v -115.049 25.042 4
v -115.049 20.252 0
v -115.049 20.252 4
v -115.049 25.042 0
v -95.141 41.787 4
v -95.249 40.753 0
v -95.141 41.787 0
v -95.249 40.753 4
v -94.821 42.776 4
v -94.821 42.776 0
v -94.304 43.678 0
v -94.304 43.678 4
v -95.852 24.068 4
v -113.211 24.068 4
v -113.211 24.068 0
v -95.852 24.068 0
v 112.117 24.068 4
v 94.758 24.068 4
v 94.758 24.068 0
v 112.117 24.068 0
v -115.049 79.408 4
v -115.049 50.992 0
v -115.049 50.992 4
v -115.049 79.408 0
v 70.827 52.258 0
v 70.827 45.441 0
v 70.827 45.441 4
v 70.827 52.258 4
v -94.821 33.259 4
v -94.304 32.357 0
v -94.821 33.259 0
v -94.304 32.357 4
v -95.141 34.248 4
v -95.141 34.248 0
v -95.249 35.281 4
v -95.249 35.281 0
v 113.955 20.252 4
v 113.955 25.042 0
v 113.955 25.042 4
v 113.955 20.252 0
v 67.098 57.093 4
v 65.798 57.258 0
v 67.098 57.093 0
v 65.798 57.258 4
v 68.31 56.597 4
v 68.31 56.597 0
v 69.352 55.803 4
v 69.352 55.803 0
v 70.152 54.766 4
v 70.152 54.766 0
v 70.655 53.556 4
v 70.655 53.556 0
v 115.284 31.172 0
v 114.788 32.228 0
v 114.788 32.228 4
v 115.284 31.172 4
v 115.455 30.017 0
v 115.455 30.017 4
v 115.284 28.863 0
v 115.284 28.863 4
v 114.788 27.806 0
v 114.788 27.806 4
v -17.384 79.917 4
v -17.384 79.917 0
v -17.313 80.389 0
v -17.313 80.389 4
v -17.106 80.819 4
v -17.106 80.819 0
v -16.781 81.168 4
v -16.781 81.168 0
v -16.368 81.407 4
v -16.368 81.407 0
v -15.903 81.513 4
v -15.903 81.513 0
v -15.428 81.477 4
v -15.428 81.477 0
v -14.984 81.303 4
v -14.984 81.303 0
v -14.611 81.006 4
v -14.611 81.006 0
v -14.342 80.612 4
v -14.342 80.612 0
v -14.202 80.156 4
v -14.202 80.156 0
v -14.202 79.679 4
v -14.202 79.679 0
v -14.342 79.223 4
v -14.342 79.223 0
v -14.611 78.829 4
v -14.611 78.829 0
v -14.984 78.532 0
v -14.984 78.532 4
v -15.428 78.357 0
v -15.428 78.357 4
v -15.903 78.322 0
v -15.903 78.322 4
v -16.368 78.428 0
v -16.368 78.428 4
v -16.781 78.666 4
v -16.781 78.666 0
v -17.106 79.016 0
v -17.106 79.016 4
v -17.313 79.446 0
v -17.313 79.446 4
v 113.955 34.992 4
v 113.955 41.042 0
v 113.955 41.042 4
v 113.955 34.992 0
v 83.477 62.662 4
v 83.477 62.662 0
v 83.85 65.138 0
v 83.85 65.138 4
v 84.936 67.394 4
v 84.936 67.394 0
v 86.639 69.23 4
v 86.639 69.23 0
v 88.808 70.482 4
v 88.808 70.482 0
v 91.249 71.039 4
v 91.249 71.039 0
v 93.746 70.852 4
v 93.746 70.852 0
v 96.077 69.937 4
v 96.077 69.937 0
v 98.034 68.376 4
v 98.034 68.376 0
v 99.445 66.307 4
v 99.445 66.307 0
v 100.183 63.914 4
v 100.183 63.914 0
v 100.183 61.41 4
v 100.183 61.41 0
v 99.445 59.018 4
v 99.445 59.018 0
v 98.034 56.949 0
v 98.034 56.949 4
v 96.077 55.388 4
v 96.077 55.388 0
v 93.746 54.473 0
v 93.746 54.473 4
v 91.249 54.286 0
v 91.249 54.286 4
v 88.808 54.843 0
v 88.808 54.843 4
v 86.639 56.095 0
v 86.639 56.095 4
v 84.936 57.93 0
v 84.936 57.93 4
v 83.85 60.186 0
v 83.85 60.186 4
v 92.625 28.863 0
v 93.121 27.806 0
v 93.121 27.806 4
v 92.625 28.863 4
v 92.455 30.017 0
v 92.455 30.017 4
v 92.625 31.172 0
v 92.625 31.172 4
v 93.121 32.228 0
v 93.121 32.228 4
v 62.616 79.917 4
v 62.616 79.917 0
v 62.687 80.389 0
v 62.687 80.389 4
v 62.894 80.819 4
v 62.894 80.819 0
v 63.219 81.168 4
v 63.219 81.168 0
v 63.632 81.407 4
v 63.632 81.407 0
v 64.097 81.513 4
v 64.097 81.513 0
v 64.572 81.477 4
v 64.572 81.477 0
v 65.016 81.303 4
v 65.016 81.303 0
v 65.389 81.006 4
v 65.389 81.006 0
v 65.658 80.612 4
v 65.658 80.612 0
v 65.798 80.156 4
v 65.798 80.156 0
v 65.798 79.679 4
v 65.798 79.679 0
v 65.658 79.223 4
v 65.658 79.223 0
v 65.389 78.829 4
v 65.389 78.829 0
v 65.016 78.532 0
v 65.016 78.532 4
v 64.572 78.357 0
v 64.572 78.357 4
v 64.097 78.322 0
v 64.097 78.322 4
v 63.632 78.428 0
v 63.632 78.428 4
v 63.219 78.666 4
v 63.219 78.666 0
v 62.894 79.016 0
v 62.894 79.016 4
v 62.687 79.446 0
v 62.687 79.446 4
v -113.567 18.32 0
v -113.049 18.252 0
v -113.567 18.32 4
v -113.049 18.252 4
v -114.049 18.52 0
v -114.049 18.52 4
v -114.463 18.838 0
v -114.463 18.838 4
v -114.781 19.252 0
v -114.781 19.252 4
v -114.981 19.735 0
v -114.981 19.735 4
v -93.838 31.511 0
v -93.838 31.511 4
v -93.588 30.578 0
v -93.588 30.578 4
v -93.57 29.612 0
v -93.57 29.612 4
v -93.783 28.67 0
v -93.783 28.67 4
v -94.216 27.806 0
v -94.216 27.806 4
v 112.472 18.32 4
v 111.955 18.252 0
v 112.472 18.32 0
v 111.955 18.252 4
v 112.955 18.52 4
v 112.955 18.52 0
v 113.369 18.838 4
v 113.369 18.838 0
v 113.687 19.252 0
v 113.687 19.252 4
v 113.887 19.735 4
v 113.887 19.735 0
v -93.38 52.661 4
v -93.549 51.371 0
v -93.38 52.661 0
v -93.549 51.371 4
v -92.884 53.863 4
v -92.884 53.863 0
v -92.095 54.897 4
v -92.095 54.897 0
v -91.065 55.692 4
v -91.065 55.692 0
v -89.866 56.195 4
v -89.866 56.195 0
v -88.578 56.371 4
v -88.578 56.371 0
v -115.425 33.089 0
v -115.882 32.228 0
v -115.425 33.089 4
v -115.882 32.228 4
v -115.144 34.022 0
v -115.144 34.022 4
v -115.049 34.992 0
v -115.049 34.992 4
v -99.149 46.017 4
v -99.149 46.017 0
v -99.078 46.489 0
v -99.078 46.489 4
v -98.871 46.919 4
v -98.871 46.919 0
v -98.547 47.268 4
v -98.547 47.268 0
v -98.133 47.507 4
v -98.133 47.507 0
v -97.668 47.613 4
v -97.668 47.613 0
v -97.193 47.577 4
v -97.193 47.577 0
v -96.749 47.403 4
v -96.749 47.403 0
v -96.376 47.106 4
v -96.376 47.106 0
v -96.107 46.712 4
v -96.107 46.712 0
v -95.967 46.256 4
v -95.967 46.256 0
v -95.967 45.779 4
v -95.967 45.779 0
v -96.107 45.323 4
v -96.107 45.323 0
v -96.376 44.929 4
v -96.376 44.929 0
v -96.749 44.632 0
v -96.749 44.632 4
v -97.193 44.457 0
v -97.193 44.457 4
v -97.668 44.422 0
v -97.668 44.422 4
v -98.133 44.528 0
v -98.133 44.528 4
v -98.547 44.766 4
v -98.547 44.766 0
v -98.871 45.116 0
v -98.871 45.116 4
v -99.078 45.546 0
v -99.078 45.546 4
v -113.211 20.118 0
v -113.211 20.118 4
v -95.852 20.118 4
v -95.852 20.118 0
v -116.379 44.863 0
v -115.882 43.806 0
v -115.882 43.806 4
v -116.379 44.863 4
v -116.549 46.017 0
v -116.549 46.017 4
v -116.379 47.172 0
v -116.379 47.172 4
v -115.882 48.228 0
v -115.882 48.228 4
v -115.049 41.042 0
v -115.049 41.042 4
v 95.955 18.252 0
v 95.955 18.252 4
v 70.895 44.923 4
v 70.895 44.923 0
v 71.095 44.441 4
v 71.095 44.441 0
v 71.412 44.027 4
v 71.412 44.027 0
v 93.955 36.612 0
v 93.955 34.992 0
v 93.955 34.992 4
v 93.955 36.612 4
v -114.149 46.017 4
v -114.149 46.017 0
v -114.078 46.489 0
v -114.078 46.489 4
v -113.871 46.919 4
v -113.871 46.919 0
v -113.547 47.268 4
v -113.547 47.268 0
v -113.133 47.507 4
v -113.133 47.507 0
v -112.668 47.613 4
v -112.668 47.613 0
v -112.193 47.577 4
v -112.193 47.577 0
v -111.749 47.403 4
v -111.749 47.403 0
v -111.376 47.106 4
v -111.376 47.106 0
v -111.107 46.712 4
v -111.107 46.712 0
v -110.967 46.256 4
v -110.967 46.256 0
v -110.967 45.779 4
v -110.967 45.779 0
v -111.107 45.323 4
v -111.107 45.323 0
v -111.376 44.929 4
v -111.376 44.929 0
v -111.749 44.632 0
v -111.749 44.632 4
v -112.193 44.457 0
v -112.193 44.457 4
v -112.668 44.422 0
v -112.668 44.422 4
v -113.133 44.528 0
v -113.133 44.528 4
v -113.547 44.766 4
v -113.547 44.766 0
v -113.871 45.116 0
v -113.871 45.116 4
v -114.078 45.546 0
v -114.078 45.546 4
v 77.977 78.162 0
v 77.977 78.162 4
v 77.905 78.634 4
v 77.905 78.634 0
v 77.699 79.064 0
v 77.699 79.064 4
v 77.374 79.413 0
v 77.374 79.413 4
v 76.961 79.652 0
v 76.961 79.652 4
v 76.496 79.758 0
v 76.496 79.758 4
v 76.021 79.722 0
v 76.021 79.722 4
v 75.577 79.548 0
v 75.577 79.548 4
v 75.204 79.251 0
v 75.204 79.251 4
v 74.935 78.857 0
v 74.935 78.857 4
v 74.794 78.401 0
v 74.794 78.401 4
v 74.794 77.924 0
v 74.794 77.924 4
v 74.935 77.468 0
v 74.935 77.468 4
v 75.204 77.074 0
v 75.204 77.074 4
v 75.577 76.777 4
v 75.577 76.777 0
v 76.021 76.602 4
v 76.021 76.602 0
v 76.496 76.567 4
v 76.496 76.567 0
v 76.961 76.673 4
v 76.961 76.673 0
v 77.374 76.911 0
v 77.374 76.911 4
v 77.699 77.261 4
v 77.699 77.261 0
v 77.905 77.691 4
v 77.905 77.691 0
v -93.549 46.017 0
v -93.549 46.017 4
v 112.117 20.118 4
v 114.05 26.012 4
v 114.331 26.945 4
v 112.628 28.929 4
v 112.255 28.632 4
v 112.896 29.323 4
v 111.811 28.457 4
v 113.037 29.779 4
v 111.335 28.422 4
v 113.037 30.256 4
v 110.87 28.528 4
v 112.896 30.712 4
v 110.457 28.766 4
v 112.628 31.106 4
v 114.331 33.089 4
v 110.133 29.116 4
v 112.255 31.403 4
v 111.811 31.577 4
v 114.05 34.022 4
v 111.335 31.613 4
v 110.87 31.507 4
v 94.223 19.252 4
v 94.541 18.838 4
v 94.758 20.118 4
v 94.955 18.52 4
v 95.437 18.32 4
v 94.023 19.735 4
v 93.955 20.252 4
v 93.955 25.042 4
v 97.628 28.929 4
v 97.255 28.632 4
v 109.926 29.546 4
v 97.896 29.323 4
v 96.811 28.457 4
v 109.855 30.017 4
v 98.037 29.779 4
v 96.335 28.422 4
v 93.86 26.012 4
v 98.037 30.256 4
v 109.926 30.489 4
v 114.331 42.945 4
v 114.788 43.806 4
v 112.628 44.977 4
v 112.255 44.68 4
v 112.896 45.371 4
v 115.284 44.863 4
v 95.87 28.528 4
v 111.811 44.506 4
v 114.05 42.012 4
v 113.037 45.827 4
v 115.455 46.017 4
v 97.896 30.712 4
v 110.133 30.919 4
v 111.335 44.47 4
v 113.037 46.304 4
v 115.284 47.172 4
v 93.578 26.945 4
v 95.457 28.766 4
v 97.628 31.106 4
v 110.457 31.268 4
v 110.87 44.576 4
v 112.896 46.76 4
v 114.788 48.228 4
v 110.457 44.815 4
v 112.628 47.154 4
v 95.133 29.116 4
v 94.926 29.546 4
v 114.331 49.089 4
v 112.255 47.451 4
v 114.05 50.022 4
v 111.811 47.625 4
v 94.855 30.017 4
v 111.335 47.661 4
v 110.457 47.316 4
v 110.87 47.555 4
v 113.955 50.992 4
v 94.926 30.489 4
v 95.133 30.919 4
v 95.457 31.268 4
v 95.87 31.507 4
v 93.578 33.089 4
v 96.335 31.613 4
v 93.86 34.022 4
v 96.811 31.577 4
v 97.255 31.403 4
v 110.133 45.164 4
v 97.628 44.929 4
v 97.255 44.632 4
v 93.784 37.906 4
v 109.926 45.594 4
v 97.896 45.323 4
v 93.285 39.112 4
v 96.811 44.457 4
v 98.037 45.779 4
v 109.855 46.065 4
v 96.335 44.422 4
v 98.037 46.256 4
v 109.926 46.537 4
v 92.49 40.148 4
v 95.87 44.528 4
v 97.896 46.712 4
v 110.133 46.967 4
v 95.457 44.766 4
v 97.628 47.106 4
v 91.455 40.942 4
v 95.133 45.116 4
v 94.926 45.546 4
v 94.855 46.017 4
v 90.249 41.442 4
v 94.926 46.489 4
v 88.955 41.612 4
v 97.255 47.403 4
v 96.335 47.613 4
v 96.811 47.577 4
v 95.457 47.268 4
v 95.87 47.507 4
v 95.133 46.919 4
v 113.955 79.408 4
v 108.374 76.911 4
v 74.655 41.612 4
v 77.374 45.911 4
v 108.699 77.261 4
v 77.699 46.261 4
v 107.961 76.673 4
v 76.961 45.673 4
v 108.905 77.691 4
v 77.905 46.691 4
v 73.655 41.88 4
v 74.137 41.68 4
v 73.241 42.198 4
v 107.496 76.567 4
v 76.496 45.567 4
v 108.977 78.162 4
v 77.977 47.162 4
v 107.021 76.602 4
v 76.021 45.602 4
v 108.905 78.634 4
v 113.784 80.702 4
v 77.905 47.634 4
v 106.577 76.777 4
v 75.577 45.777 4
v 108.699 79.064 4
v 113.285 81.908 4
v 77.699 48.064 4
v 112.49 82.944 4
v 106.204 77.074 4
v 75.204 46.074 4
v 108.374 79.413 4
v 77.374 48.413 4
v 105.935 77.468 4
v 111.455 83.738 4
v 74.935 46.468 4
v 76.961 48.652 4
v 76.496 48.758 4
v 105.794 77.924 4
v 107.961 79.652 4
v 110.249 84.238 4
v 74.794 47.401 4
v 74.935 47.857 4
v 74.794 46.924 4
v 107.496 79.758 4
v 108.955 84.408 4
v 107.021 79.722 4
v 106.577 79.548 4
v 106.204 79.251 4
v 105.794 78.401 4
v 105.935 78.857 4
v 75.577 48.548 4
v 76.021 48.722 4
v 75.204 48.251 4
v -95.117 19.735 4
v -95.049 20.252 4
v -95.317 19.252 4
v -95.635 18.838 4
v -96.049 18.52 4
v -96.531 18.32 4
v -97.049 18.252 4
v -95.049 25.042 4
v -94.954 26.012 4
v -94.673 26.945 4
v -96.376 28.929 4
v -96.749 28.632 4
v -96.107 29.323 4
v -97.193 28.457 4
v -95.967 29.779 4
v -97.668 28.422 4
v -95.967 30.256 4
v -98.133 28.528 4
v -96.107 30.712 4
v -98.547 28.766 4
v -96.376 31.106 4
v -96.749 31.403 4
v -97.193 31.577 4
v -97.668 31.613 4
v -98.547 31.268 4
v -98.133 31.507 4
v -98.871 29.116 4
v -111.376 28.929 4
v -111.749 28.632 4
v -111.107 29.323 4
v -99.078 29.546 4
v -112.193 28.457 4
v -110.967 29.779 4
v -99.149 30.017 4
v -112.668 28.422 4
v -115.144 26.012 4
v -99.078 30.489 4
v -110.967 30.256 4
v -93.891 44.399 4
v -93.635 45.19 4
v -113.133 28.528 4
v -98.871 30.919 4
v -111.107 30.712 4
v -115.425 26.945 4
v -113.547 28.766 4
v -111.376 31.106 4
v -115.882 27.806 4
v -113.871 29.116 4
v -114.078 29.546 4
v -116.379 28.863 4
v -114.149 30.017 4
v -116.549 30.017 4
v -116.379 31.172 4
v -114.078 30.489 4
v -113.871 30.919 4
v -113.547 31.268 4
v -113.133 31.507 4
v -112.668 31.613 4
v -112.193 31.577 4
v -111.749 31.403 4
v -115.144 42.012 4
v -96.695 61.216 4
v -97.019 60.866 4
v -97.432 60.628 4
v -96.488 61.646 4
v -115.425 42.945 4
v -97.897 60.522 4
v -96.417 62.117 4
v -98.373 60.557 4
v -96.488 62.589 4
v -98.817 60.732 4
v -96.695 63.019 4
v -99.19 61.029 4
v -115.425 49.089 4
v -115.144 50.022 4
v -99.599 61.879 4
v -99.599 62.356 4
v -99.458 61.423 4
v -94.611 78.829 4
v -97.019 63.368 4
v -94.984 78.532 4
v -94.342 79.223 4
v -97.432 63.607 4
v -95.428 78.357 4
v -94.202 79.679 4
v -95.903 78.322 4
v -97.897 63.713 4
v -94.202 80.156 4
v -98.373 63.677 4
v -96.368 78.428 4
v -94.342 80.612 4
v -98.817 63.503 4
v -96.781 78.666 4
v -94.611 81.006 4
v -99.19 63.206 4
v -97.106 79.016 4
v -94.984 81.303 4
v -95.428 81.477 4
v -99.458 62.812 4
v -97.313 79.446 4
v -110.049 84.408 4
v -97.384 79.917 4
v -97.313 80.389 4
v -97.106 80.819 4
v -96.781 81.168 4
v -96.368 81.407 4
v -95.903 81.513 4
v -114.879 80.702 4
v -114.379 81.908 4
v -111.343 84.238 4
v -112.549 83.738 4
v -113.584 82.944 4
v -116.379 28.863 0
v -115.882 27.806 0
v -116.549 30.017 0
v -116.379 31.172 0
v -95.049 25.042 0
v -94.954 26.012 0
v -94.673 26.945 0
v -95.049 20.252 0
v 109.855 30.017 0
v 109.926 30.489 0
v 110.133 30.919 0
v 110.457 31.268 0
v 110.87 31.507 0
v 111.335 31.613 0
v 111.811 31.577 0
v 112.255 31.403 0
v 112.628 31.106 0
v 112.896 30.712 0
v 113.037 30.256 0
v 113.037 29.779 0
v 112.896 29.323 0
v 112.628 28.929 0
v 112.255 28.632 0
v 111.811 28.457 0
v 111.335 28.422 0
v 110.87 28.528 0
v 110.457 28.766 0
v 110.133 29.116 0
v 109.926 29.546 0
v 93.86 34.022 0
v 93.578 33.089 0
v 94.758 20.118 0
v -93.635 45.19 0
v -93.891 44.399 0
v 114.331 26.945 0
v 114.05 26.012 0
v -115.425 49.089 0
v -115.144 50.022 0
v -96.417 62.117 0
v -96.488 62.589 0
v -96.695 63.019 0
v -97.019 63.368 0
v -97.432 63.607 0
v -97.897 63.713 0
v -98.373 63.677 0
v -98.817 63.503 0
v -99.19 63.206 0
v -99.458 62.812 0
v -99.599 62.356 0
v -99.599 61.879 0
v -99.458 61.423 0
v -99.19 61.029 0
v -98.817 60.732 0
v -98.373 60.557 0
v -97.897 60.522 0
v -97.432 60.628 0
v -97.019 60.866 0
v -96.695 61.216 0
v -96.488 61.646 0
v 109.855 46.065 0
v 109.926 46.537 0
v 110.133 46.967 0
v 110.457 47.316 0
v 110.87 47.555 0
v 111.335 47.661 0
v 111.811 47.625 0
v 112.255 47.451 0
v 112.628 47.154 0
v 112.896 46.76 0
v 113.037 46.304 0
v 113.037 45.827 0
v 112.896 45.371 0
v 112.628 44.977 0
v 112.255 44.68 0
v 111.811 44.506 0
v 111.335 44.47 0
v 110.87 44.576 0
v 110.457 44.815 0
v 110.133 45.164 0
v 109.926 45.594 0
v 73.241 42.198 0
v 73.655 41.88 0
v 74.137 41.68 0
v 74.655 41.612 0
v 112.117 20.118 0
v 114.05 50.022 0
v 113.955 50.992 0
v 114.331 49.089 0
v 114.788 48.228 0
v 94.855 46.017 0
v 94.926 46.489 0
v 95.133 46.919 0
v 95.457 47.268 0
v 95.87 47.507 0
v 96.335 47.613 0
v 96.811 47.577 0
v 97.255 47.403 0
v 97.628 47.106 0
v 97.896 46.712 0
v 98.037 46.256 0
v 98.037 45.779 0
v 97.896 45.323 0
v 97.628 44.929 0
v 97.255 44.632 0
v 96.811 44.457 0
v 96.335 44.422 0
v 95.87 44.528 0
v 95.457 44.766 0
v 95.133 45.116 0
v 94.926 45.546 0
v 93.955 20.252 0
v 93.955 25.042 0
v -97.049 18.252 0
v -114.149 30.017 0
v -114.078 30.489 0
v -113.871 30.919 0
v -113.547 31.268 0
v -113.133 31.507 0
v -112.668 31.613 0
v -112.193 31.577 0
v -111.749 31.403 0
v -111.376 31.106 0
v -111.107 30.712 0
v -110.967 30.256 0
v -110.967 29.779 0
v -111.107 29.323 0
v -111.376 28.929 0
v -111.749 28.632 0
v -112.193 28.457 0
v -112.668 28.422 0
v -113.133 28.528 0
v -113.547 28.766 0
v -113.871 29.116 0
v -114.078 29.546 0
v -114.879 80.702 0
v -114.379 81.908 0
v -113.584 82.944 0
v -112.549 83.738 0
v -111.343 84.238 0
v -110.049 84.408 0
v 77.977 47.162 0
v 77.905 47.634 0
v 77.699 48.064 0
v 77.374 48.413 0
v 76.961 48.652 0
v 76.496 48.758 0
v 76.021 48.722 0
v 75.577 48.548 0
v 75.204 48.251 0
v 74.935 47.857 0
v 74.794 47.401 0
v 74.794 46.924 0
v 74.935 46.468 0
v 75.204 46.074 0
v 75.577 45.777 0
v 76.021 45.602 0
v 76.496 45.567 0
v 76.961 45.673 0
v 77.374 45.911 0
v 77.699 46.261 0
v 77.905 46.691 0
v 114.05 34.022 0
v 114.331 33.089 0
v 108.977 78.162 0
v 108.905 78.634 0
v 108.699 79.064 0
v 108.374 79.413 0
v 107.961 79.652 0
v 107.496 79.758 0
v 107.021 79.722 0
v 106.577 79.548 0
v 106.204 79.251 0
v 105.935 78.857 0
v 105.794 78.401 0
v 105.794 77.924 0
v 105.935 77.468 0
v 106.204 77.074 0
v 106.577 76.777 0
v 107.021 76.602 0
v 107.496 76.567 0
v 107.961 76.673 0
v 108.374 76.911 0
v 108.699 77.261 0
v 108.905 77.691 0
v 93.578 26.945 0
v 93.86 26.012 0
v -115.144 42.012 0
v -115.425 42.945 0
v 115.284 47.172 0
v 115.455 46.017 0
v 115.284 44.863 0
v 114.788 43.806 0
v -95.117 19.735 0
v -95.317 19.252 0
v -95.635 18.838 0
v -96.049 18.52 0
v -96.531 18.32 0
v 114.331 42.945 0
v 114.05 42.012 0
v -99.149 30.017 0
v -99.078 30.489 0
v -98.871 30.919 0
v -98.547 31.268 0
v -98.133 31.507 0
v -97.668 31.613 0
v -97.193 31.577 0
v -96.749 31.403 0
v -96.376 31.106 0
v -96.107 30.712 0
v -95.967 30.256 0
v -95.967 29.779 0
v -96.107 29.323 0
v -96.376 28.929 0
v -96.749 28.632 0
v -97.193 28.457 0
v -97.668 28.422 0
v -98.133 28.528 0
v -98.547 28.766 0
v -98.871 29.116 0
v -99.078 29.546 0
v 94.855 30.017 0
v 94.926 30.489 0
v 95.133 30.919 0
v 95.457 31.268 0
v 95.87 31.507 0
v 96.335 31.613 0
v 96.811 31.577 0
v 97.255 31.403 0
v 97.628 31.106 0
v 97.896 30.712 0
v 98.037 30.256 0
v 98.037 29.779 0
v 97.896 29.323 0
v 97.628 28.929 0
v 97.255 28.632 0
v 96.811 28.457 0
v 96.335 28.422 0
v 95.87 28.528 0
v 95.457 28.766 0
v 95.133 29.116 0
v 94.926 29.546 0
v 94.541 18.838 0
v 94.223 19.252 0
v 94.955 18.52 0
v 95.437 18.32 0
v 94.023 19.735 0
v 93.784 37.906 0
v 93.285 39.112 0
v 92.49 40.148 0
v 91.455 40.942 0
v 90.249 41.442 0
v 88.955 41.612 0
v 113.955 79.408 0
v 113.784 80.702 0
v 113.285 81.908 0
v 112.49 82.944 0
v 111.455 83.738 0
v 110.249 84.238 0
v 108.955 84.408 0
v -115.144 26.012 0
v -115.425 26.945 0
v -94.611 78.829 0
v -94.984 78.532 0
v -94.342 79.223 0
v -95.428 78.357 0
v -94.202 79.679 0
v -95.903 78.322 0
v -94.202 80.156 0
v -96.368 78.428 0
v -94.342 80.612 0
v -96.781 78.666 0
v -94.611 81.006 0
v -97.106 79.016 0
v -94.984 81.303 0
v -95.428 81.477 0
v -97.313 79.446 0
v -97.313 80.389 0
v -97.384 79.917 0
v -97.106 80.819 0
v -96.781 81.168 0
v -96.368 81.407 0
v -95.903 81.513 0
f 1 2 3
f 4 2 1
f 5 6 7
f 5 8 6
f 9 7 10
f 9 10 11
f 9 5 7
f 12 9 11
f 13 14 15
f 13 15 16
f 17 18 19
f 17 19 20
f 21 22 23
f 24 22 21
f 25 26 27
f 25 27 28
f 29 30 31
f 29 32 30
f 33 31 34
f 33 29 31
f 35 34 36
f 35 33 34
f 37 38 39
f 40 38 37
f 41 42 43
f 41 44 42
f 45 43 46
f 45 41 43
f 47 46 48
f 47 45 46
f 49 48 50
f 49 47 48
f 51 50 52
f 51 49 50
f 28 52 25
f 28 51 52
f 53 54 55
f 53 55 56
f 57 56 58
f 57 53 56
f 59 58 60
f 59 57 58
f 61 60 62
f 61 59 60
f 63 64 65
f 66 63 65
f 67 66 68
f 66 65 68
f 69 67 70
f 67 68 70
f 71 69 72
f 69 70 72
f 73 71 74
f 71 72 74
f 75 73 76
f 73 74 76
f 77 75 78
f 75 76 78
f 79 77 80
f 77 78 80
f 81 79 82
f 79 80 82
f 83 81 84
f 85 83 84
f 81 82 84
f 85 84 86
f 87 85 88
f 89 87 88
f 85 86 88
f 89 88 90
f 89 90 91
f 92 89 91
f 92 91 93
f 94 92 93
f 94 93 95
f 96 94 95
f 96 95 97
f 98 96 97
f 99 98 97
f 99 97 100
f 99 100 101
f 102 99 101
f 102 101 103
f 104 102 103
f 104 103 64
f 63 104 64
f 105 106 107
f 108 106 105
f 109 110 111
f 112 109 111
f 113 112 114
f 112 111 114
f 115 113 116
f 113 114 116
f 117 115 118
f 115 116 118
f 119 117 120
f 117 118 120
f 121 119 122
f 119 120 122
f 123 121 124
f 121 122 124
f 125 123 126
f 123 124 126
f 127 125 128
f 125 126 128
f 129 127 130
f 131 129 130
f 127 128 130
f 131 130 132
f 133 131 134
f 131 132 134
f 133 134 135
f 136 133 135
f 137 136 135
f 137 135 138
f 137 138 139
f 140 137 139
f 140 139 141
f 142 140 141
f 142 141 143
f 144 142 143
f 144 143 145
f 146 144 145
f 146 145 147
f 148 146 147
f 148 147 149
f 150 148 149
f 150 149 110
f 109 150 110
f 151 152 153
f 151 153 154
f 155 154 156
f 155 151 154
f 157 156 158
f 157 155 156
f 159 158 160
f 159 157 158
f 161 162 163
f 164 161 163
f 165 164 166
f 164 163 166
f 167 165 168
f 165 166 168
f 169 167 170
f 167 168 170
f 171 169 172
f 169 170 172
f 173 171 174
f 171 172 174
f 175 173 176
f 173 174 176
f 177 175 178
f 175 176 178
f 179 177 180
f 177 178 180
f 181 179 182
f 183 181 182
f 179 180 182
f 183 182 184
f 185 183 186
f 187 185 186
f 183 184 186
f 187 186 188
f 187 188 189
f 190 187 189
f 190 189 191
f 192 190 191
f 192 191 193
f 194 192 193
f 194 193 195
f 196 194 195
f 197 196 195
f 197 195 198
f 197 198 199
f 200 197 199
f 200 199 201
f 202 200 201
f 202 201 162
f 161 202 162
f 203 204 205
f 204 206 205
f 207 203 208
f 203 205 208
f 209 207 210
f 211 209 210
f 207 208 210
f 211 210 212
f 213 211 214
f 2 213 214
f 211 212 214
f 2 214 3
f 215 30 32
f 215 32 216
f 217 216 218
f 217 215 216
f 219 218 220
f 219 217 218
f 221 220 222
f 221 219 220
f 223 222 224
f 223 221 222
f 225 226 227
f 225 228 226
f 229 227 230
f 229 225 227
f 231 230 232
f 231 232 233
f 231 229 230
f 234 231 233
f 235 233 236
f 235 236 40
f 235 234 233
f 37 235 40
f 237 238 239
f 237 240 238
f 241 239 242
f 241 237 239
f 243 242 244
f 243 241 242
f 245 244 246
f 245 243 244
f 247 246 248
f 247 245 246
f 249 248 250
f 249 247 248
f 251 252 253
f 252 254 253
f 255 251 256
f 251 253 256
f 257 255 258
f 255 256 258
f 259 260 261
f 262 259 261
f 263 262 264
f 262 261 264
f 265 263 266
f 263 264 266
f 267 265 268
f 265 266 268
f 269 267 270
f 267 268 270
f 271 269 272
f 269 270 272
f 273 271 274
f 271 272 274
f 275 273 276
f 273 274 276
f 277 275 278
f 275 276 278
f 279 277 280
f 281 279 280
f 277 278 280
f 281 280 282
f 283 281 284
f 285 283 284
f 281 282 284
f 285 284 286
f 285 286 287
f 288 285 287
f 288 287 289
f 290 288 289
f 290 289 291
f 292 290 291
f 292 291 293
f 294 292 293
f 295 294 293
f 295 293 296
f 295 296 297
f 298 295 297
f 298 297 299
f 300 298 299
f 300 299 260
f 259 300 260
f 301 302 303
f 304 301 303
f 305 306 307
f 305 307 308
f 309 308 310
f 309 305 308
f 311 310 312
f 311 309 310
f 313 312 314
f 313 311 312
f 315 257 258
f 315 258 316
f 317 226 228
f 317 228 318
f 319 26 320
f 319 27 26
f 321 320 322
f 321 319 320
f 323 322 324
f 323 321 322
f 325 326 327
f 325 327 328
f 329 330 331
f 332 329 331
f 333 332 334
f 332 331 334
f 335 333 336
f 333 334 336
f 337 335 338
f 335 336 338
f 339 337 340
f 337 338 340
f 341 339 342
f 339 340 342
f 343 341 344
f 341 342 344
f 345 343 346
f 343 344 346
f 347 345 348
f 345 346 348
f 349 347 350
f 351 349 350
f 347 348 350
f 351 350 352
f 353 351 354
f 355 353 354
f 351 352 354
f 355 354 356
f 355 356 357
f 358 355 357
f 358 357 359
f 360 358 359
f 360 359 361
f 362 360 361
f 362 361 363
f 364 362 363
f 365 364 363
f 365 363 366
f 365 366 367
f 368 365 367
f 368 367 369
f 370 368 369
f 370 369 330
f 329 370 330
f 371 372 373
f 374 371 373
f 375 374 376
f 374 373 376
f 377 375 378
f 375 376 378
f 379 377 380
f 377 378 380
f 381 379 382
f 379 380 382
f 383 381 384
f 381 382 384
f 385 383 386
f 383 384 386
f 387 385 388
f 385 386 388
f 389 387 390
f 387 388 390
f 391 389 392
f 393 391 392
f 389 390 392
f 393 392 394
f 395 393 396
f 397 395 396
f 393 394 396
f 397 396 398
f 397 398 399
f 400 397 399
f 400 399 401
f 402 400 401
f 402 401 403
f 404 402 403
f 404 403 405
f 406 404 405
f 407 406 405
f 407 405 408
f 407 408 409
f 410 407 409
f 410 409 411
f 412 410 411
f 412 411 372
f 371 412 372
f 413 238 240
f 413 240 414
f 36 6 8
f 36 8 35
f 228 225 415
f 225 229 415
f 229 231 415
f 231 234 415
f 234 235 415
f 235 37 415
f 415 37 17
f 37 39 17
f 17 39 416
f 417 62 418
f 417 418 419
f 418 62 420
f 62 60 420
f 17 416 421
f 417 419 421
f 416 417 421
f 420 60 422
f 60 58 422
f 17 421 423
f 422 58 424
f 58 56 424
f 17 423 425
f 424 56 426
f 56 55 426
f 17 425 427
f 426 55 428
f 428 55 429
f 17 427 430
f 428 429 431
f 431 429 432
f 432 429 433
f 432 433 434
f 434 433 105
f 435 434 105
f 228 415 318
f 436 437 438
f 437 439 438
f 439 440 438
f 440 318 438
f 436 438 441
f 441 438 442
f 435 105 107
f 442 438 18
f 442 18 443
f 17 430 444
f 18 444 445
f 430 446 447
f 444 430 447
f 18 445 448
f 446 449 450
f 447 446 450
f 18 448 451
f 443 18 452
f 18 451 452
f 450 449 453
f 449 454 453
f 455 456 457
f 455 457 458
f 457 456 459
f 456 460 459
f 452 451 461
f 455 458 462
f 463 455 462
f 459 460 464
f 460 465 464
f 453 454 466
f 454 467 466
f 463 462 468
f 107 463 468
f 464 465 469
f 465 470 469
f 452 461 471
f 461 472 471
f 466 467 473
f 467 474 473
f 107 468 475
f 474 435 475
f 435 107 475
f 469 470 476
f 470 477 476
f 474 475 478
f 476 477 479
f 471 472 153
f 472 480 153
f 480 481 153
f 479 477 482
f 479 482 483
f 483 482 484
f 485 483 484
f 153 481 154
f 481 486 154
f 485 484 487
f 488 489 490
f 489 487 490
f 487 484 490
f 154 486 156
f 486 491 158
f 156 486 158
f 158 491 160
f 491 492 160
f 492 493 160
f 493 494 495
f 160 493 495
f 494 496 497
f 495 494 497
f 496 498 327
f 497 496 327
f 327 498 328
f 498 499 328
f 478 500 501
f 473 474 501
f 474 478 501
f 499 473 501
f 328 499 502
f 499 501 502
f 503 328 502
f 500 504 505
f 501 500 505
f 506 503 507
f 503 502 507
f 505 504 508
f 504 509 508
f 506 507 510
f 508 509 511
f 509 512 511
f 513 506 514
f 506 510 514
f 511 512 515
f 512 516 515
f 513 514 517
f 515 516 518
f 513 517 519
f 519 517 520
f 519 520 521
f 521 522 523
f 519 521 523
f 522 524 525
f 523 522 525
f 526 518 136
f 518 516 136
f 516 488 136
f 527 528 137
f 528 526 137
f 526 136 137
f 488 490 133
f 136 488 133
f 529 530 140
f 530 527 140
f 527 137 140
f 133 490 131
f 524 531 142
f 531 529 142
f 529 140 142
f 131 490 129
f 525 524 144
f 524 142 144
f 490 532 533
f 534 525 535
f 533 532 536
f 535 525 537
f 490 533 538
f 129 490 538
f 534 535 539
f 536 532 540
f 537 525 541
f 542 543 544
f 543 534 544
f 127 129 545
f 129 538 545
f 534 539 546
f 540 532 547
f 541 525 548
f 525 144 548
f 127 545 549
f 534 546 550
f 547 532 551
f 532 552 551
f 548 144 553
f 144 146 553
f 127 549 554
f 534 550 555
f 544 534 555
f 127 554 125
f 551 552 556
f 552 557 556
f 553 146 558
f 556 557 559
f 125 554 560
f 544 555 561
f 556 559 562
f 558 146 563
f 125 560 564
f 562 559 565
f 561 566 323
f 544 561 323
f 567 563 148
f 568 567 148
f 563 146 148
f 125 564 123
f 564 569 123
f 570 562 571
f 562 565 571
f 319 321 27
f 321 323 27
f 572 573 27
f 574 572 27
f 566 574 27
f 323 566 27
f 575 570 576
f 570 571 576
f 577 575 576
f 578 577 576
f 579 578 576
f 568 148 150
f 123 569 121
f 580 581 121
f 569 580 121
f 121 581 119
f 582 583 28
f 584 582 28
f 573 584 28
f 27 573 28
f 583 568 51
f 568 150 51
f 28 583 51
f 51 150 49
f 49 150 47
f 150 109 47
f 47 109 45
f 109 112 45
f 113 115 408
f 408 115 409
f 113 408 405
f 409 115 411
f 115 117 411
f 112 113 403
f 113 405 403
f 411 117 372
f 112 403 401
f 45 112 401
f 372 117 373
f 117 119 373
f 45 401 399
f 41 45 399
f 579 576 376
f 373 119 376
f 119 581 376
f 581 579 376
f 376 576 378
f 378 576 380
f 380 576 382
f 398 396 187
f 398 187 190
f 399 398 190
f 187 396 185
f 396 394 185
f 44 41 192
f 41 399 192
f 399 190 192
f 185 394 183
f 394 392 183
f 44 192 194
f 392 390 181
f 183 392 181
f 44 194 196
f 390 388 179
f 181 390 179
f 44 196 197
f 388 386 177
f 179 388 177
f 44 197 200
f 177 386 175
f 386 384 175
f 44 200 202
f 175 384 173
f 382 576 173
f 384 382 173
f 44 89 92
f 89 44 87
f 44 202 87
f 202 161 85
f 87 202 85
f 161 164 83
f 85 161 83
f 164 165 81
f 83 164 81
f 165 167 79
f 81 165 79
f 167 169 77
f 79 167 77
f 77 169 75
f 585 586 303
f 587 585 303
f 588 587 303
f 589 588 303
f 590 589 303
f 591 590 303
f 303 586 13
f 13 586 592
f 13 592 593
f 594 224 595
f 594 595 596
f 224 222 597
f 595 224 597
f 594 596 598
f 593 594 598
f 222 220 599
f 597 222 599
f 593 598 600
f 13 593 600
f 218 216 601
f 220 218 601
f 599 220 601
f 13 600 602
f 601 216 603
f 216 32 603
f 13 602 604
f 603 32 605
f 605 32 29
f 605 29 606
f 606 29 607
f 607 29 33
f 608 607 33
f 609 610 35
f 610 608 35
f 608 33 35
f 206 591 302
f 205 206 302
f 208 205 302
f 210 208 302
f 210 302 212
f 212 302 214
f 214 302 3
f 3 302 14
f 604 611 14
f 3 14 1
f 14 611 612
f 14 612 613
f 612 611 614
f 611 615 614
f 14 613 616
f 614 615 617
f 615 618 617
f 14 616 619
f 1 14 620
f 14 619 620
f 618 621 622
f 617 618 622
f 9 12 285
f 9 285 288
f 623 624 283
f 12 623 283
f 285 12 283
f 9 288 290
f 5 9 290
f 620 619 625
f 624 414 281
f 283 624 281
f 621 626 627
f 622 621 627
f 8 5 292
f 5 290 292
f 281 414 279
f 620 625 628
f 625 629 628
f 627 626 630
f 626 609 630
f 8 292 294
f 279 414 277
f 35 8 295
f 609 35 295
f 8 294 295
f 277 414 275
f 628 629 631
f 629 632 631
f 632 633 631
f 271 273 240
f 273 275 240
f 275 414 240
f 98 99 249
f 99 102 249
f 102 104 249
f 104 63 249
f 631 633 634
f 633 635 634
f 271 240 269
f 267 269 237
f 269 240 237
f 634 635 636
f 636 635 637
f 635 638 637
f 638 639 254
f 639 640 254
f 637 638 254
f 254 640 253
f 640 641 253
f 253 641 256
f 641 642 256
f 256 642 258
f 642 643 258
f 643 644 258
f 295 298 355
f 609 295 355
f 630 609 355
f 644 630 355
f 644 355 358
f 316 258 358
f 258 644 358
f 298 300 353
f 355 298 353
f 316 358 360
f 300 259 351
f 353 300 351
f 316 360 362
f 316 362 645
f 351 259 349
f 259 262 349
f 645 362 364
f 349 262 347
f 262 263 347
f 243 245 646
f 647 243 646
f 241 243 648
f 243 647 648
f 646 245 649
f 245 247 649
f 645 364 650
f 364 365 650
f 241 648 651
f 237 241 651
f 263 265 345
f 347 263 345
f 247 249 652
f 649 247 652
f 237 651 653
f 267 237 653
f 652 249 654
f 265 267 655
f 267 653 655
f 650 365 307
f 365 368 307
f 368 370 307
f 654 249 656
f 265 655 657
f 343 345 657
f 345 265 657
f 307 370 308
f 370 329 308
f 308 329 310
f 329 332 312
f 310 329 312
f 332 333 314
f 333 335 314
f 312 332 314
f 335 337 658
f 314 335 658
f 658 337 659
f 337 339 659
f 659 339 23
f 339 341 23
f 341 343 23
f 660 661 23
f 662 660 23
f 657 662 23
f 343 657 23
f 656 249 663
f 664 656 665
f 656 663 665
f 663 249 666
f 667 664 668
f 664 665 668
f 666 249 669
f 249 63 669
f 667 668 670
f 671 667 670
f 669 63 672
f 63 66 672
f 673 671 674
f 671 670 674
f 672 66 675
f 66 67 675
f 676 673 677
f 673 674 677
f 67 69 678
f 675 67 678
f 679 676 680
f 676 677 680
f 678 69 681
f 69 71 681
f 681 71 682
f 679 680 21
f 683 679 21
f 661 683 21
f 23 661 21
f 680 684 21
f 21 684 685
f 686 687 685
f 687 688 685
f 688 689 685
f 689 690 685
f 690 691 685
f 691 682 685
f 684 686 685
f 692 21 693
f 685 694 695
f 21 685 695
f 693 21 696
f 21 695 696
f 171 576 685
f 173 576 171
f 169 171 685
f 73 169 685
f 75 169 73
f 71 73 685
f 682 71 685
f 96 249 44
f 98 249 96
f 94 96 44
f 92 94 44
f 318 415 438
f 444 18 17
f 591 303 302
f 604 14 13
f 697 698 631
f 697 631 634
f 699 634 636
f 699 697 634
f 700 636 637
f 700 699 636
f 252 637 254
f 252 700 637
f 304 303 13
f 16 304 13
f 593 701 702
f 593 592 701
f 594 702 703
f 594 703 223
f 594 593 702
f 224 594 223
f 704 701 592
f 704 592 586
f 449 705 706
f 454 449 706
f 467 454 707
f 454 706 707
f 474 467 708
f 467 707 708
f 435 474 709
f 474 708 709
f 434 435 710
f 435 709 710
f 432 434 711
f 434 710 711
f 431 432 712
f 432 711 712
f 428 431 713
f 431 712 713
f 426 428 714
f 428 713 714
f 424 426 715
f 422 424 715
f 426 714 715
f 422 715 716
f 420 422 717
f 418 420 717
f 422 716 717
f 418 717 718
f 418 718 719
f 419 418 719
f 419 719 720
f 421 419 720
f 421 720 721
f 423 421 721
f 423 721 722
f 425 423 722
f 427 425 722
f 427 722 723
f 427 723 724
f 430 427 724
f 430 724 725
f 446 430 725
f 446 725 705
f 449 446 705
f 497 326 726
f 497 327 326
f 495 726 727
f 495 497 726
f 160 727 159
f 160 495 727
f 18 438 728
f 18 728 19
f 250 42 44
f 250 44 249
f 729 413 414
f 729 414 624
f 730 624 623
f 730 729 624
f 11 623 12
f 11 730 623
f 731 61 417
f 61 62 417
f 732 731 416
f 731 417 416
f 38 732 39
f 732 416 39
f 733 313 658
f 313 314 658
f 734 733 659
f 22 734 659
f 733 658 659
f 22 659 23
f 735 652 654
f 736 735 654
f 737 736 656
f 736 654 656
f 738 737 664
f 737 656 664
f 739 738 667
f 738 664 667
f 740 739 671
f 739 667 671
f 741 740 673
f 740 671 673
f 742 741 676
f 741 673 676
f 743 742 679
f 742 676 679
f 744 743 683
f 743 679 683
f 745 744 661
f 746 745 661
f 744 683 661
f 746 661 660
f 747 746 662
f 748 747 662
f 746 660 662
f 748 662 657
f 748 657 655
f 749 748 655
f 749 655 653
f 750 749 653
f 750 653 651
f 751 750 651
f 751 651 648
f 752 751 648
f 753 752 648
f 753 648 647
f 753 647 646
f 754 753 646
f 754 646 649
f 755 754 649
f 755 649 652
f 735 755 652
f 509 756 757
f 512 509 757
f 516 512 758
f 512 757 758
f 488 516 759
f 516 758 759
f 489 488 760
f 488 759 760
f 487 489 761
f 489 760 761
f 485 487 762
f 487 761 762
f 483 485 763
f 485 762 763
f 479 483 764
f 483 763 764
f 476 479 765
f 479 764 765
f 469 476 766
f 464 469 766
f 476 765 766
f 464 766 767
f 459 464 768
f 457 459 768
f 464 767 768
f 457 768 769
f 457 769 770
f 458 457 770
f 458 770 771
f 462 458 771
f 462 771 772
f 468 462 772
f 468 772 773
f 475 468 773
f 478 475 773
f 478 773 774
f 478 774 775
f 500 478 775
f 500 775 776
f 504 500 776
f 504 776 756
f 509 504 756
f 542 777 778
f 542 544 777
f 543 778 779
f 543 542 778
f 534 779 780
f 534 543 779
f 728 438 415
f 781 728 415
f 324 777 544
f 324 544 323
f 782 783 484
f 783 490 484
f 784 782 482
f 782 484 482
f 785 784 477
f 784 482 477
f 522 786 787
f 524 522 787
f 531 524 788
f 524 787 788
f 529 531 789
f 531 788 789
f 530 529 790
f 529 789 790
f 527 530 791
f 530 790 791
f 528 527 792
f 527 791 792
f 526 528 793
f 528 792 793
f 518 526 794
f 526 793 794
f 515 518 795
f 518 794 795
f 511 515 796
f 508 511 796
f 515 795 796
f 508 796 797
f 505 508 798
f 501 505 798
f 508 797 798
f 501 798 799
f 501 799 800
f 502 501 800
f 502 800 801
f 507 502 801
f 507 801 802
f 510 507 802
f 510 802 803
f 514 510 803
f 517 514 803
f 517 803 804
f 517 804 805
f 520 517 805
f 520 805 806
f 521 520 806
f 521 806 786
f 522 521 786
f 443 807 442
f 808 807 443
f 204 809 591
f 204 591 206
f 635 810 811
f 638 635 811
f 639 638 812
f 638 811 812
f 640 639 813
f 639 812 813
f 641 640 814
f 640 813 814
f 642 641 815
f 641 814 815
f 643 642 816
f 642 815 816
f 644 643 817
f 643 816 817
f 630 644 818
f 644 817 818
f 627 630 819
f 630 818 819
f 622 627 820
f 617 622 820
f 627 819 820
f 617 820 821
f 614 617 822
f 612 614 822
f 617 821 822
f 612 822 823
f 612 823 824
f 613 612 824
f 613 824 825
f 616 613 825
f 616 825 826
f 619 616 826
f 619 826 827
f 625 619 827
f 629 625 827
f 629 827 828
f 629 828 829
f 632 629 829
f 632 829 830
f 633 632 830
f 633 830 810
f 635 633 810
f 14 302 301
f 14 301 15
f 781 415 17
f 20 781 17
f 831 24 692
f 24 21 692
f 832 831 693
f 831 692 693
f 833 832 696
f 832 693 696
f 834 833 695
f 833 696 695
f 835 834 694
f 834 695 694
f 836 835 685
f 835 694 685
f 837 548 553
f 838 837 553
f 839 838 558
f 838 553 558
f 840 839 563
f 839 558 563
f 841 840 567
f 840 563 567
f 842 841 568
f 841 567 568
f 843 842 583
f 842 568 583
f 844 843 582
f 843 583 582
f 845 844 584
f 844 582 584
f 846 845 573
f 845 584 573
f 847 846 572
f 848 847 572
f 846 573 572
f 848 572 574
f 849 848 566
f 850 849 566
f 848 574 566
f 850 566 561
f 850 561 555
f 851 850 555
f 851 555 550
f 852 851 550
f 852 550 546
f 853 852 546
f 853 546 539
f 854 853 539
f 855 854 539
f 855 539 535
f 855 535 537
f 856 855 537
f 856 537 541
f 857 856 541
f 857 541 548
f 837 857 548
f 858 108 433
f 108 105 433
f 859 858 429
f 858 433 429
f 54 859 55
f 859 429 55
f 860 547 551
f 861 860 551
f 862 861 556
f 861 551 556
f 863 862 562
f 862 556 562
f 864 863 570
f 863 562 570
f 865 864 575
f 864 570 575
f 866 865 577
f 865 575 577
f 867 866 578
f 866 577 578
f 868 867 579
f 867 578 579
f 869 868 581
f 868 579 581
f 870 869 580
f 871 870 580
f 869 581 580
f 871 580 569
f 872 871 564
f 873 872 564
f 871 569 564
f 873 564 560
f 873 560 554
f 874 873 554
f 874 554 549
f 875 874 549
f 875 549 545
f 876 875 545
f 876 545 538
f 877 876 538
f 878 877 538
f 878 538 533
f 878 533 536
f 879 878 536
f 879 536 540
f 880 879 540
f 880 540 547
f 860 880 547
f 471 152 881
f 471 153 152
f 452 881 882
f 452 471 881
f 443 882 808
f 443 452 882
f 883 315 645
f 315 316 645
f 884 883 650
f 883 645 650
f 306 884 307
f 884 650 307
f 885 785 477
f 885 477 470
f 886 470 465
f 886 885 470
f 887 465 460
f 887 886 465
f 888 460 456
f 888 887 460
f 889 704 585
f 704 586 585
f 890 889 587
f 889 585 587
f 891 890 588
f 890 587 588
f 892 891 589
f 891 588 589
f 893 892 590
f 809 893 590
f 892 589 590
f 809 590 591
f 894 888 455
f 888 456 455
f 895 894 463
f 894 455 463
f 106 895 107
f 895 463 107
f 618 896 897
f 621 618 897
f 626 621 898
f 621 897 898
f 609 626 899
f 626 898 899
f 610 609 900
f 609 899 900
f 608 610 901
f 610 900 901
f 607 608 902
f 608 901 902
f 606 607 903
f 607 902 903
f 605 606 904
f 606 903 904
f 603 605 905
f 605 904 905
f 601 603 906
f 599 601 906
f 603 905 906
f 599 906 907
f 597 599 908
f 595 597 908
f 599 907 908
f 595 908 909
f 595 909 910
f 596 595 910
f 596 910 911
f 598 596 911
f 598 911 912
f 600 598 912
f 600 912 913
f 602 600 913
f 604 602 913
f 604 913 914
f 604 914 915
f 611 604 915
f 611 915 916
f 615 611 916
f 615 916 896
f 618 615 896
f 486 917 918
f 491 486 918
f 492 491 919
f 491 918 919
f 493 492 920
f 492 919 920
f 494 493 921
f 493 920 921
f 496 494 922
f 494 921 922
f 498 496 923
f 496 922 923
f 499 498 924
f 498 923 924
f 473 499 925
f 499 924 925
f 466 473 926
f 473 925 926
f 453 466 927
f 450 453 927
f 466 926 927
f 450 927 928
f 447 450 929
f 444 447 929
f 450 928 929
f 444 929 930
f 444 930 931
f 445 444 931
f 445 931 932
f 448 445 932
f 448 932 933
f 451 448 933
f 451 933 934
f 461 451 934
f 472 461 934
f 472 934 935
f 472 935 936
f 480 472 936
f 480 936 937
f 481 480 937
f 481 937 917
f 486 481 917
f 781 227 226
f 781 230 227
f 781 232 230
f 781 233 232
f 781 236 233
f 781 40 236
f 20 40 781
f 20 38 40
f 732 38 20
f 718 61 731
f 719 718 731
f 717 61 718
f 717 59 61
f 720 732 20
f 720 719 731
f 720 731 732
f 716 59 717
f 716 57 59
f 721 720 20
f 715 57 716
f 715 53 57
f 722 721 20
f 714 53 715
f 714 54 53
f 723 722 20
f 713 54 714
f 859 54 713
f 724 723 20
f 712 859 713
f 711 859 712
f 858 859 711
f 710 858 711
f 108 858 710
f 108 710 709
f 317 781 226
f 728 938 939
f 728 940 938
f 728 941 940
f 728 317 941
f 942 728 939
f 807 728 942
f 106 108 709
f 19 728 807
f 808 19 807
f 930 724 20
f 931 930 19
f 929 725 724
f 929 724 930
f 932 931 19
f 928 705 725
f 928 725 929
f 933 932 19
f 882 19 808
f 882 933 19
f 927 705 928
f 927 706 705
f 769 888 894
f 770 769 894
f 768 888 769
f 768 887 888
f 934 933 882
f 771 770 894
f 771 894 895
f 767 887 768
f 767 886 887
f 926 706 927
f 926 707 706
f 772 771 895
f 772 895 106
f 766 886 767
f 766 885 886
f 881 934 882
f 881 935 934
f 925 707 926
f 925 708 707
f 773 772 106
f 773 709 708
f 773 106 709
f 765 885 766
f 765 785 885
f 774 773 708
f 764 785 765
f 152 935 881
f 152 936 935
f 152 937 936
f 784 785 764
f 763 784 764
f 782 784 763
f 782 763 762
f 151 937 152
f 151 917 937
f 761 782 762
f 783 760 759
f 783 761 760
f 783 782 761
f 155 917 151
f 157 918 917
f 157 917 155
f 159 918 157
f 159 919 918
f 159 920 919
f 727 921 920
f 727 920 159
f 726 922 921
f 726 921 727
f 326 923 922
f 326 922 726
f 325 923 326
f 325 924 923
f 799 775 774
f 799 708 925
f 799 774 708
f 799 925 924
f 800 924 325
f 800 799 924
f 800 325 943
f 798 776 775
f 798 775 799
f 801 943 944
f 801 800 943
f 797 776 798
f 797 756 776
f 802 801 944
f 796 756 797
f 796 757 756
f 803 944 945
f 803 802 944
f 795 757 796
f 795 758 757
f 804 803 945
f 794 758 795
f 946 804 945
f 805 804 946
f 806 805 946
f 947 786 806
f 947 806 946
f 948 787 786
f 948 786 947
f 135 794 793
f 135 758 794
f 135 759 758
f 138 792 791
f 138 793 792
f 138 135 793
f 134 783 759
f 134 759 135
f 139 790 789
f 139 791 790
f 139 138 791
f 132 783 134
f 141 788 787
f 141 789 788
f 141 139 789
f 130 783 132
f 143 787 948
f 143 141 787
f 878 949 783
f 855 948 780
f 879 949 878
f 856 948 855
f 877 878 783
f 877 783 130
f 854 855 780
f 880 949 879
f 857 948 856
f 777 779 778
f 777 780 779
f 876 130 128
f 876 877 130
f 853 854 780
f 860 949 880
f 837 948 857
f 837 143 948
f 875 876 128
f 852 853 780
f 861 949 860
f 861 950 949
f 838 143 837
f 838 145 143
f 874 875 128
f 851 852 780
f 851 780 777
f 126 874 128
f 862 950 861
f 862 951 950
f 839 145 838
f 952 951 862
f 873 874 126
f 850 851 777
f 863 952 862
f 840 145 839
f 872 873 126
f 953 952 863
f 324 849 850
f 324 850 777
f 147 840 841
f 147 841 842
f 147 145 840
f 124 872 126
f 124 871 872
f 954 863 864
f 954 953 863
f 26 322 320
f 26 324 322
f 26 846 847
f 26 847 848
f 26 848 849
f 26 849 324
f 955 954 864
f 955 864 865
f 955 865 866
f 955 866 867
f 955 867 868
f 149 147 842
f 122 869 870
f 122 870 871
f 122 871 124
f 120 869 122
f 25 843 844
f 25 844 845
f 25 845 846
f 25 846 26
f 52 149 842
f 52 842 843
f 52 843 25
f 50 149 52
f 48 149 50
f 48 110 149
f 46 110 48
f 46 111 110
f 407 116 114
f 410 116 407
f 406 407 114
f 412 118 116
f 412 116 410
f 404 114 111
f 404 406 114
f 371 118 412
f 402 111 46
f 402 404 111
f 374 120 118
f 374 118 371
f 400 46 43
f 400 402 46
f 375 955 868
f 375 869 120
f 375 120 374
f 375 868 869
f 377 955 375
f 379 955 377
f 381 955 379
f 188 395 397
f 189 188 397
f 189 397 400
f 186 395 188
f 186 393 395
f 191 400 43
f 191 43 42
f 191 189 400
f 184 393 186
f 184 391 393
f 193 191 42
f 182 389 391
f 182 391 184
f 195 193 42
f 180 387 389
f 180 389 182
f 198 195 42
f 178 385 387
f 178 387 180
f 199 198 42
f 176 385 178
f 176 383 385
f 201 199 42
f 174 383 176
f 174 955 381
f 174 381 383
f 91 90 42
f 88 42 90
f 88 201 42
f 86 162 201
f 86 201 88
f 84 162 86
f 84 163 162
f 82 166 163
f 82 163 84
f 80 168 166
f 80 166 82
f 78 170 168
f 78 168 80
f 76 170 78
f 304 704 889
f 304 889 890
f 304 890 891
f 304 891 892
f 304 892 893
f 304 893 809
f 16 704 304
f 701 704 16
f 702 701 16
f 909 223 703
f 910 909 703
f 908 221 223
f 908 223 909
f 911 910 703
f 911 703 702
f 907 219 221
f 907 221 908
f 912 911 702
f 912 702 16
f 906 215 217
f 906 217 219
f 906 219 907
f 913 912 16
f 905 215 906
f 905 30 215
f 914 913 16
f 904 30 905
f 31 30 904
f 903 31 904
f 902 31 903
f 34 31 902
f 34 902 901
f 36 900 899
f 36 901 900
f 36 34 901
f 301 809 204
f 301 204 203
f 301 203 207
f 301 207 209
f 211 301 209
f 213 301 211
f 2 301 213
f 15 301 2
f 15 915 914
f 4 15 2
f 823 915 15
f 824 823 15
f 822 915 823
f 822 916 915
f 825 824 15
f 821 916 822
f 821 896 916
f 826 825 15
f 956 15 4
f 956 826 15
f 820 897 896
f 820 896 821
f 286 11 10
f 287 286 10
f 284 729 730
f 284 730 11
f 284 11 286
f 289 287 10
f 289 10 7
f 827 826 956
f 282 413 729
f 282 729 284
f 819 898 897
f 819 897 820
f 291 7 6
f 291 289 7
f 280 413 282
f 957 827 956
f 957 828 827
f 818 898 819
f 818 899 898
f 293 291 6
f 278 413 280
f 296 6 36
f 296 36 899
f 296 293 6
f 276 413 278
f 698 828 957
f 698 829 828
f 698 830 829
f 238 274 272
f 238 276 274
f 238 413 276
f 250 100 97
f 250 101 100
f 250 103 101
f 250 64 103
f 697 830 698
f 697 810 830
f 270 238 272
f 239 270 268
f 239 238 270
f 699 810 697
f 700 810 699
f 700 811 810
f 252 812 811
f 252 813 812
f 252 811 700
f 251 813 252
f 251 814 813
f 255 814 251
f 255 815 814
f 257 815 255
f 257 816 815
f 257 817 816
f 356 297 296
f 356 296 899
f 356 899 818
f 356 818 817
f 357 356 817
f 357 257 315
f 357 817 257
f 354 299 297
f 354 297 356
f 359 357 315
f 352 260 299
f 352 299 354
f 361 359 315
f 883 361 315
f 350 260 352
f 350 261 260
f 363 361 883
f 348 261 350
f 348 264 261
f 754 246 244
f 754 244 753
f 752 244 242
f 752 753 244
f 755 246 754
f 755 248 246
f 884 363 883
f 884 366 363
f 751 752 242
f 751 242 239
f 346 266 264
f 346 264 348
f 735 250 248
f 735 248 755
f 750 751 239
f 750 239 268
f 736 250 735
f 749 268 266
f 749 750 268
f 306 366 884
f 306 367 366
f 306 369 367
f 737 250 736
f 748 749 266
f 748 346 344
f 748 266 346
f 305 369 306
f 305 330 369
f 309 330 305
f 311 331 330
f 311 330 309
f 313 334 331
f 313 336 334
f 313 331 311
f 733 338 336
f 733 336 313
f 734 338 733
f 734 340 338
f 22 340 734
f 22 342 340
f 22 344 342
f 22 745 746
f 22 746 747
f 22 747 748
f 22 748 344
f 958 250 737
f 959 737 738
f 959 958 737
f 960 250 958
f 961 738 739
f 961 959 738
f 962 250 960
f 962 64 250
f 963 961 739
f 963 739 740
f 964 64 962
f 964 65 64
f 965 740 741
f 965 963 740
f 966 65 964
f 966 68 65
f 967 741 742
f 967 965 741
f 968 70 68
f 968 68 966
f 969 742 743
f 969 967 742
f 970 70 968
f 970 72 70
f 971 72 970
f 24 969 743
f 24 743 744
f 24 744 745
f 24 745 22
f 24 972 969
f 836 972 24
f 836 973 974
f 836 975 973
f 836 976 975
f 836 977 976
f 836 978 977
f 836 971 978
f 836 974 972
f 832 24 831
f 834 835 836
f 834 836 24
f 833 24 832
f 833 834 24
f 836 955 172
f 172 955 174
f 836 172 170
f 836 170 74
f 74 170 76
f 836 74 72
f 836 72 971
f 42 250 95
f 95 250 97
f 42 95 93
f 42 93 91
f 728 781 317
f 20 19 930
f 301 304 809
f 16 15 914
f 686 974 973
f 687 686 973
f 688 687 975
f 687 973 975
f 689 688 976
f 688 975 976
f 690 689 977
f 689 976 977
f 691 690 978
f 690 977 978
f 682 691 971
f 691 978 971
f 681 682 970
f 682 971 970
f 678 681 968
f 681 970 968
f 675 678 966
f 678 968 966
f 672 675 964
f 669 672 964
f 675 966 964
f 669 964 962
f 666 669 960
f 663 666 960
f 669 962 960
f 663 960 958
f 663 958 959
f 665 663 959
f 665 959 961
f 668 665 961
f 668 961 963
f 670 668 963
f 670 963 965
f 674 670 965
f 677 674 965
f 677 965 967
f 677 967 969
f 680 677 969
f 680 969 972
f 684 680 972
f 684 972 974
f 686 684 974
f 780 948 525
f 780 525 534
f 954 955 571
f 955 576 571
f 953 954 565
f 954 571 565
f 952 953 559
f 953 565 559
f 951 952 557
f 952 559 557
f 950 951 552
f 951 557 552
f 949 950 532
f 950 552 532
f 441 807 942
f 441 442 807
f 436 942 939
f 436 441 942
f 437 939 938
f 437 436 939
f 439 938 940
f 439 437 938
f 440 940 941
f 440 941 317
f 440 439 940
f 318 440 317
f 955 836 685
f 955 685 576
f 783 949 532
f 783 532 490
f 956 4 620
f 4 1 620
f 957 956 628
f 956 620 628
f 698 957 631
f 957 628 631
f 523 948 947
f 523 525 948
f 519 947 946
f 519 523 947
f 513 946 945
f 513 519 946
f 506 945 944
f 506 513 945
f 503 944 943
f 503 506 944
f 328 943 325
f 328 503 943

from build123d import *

# Parameters (mm, degrees)
RESSALTO_EXTRUS_O1_DEPTH = 4
M3_CLEARANCE_HOLE2_D     = 3.2
ESBO_O7_R                = 8.4
CORTE_EXTRUS_O1_DEPTH    = 10
M3_CLEARANCE_HOLE1_D     = 3.2
M3_CLEARANCE_HOLE3_D     = 3.2
FILETE1_R                = 5
M3_CLEARANCE_HOLE5_D     = 3.2
FILETE2_R                = 2
ESBO_O16_W               = 17.35833251
ESBO_O16_H               = 3.95
ESBO_O16_W_2             = 17.358332509
CUT_EXTRUDE1_DEPTH       = 4
FILLET2_R                = 5


with BuildPart() as part:
    # Esboço1 → Ressalto-extrusão1 (new body)
    with BuildSketch(Plane.XY):
        with BuildLine():
            Line((-95.048931647, 26.894793301), (-95.048931647, 18.252242094))
            Line((-95.048931647, 18.252242094), (-115.048931647, 18.252242094))
            Line((-115.048931647, 18.252242094), (-115.048931647, 26.894793301))
            ThreePointArc((-115.048931647, 26.894793301), (-116.548931647, 30.0172923), (-115.048931647, 33.139791299))
            Line((-115.048931647, 33.139791299), (-115.048931647, 42.894793301))
            ThreePointArc((-115.048931647, 42.894793301), (-116.548931647, 46.0172923), (-115.048931647, 49.139791299))
            Line((-115.048931647, 49.139791299), (-115.048931647, 84.40808297))
            Line((-115.048931647, 84.40808297), (113.954781763, 84.40808297))
            Line((113.954781763, 84.40808297), (113.954781763, 49.139791299))
            ThreePointArc((113.954781763, 49.139791299), (115.454781763, 46.0172923), (113.954781763, 42.894793301))
            Line((113.954781763, 42.894793301), (113.954781763, 33.139791299))
            ThreePointArc((113.954781763, 33.139791299), (115.454781763, 30.0172923), (113.954781763, 26.894793301))
            Line((113.954781763, 26.894793301), (113.954781763, 18.252242094))
            Line((113.954781763, 18.252242094), (93.954781763, 18.252242094))
            Line((93.954781763, 18.252242094), (93.954781763, 26.894793301))
            ThreePointArc((93.954781763, 26.894793301), (92.454781763, 30.0172923), (93.954781763, 33.139791299))
            Line((93.954781763, 33.139791299), (93.954781763, 41.612292304))
            Line((93.954781763, 41.612292304), (73.826556743, 41.612292304))
            Line((73.826556743, 41.612292304), (70.826556743, 44.612292304))
            Line((70.826556743, 44.612292304), (70.826556743, 57.286376167))
            Line((70.826556743, 57.286376167), (-93.548931647, 56.342842726))
            Line((-93.548931647, 56.342842726), (-93.548931647, 46.0172923))
            ThreePointArc((-93.548931647, 46.0172923), (-93.999283778, 44.173383409), (-95.248931647, 42.744678666))
            Line((-95.248931647, 42.744678666), (-95.248931647, 33.289905934))
            ThreePointArc((-95.248931647, 33.289905934), (-93.550886325, 30.142326699), (-95.048931647, 26.894793301))
        make_face()
    extrude(amount=RESSALTO_EXTRUS_O1_DEPTH)

    # M3 Clearance Hole2 (through all)
    with Locations(Plane.XY.offset(4)):
        with Locations((-112.548931647, 46.0172923), (-112.548931647, 30.0172923), (-97.548931647, 30.0172923), (-97.548931647, 46.0172923), (96.454781763, 30.0172923), (111.454781763, 30.0172923), (111.454781763, 46.06544156), (96.454781763, 46.0172923)):
            Hole(M3_CLEARANCE_HOLE2_D / 2)

    # Esboço7 → Corte-extrusão1 (cut)
    with BuildSketch(Plane(origin=(0, 0, 0), x_dir=(-1, 0, 0), z_dir=(0, 0, -1))):
        with Locations((-91.876556743, 62.662292304)):
            Circle(ESBO_O7_R)
    extrude(amount=-CORTE_EXTRUS_O1_DEPTH, mode=Mode.SUBTRACT)

    # M3 Clearance Hole1 (through all)
    with Locations(Plane(origin=(0, 0, 0), x_dir=(-1, 0, 0), z_dir=(0, 0, -1))):
        with Locations((98.016827352, 62.117292304)):
            Hole(M3_CLEARANCE_HOLE1_D / 2)

    # M3 Clearance Hole3 (through all)
    with Locations(Plane(origin=(0, 0, 0), x_dir=(-1, 0, 0), z_dir=(0, 0, -1))):
        with Locations((-76.376556743, 47.162292304), (-76.376556743, 78.162292304), (-107.376556743, 78.162292304)):
            Hole(M3_CLEARANCE_HOLE3_D / 2)

    # Filete1
    filete1_edges = [part.edges().sort_by_distance(p)[0] for p in [
        (113.954781763, 33.139791299, 2),
        (113.954781763, 26.894793301, 2),
        (93.954781763, 26.894793301, 2),
        (93.954781763, 33.139791299, 2),
        (93.954781763, 41.612292304, 2),
        (70.826556743, 57.286376167, 2),
        (-95.248931647, 42.744678666, 2),
        (-95.248931647, 33.289905934, 2),
        (-95.048931647, 26.894793301, 2),
        (-115.048931647, 26.894793301, 2),
        (-115.048931647, 33.139791299, 2),
        (-115.048931647, 42.894793301, 2),
        (-115.048931647, 49.139791299, 2),
        (-115.048931647, 84.40808297, 2),
        (113.954781763, 84.40808297, 2),
        (113.954781763, 49.139791299, 2),
        (113.954781763, 42.894793301, 2),
    ]]
    fillet(filete1_edges, radius=FILETE1_R)

    # M3 Clearance Hole5 (through all)
    with Locations(Plane.XY.offset(4)):
        with Locations((-95.783895796, 79.917292304), (64.216104204, 79.917292304), (-15.783895796, 79.917292304)):
            Hole(M3_CLEARANCE_HOLE5_D / 2)

    # Filete2
    filete2_edges = [part.edges().sort_by_distance(p)[0] for p in [
        (113.954781763, 18.252242094, 2),
        (93.954781763, 18.252242094, 2),
        (73.826556743, 41.612292304, 2),
        (70.826556743, 44.612292304, 2),
        (-95.048931647, 18.252242094, 2),
        (-115.048931647, 18.252242094, 2),
    ]]
    fillet(filete2_edges, radius=FILETE2_R)

    # Esboço16 → Cut-Extrude1 (cut)
    with BuildSketch(Plane.XY.offset(4)):
        with Locations((-104.531590398, 22.092946092)):
            Rectangle(ESBO_O16_W, ESBO_O16_H)
        with Locations((103.437440514, 22.092946092)):
            Rectangle(ESBO_O16_W_2, ESBO_O16_H)
    extrude(amount=-CUT_EXTRUDE1_DEPTH, mode=Mode.SUBTRACT)

    # Fillet2
    fillet2_edges = [part.edges().sort_by_distance(p)[0] for p in [
        (-93.548931647, 56.342842726, 2),
    ]]
    fillet(fillet2_edges, radius=FILLET2_R)


solid = part.part
